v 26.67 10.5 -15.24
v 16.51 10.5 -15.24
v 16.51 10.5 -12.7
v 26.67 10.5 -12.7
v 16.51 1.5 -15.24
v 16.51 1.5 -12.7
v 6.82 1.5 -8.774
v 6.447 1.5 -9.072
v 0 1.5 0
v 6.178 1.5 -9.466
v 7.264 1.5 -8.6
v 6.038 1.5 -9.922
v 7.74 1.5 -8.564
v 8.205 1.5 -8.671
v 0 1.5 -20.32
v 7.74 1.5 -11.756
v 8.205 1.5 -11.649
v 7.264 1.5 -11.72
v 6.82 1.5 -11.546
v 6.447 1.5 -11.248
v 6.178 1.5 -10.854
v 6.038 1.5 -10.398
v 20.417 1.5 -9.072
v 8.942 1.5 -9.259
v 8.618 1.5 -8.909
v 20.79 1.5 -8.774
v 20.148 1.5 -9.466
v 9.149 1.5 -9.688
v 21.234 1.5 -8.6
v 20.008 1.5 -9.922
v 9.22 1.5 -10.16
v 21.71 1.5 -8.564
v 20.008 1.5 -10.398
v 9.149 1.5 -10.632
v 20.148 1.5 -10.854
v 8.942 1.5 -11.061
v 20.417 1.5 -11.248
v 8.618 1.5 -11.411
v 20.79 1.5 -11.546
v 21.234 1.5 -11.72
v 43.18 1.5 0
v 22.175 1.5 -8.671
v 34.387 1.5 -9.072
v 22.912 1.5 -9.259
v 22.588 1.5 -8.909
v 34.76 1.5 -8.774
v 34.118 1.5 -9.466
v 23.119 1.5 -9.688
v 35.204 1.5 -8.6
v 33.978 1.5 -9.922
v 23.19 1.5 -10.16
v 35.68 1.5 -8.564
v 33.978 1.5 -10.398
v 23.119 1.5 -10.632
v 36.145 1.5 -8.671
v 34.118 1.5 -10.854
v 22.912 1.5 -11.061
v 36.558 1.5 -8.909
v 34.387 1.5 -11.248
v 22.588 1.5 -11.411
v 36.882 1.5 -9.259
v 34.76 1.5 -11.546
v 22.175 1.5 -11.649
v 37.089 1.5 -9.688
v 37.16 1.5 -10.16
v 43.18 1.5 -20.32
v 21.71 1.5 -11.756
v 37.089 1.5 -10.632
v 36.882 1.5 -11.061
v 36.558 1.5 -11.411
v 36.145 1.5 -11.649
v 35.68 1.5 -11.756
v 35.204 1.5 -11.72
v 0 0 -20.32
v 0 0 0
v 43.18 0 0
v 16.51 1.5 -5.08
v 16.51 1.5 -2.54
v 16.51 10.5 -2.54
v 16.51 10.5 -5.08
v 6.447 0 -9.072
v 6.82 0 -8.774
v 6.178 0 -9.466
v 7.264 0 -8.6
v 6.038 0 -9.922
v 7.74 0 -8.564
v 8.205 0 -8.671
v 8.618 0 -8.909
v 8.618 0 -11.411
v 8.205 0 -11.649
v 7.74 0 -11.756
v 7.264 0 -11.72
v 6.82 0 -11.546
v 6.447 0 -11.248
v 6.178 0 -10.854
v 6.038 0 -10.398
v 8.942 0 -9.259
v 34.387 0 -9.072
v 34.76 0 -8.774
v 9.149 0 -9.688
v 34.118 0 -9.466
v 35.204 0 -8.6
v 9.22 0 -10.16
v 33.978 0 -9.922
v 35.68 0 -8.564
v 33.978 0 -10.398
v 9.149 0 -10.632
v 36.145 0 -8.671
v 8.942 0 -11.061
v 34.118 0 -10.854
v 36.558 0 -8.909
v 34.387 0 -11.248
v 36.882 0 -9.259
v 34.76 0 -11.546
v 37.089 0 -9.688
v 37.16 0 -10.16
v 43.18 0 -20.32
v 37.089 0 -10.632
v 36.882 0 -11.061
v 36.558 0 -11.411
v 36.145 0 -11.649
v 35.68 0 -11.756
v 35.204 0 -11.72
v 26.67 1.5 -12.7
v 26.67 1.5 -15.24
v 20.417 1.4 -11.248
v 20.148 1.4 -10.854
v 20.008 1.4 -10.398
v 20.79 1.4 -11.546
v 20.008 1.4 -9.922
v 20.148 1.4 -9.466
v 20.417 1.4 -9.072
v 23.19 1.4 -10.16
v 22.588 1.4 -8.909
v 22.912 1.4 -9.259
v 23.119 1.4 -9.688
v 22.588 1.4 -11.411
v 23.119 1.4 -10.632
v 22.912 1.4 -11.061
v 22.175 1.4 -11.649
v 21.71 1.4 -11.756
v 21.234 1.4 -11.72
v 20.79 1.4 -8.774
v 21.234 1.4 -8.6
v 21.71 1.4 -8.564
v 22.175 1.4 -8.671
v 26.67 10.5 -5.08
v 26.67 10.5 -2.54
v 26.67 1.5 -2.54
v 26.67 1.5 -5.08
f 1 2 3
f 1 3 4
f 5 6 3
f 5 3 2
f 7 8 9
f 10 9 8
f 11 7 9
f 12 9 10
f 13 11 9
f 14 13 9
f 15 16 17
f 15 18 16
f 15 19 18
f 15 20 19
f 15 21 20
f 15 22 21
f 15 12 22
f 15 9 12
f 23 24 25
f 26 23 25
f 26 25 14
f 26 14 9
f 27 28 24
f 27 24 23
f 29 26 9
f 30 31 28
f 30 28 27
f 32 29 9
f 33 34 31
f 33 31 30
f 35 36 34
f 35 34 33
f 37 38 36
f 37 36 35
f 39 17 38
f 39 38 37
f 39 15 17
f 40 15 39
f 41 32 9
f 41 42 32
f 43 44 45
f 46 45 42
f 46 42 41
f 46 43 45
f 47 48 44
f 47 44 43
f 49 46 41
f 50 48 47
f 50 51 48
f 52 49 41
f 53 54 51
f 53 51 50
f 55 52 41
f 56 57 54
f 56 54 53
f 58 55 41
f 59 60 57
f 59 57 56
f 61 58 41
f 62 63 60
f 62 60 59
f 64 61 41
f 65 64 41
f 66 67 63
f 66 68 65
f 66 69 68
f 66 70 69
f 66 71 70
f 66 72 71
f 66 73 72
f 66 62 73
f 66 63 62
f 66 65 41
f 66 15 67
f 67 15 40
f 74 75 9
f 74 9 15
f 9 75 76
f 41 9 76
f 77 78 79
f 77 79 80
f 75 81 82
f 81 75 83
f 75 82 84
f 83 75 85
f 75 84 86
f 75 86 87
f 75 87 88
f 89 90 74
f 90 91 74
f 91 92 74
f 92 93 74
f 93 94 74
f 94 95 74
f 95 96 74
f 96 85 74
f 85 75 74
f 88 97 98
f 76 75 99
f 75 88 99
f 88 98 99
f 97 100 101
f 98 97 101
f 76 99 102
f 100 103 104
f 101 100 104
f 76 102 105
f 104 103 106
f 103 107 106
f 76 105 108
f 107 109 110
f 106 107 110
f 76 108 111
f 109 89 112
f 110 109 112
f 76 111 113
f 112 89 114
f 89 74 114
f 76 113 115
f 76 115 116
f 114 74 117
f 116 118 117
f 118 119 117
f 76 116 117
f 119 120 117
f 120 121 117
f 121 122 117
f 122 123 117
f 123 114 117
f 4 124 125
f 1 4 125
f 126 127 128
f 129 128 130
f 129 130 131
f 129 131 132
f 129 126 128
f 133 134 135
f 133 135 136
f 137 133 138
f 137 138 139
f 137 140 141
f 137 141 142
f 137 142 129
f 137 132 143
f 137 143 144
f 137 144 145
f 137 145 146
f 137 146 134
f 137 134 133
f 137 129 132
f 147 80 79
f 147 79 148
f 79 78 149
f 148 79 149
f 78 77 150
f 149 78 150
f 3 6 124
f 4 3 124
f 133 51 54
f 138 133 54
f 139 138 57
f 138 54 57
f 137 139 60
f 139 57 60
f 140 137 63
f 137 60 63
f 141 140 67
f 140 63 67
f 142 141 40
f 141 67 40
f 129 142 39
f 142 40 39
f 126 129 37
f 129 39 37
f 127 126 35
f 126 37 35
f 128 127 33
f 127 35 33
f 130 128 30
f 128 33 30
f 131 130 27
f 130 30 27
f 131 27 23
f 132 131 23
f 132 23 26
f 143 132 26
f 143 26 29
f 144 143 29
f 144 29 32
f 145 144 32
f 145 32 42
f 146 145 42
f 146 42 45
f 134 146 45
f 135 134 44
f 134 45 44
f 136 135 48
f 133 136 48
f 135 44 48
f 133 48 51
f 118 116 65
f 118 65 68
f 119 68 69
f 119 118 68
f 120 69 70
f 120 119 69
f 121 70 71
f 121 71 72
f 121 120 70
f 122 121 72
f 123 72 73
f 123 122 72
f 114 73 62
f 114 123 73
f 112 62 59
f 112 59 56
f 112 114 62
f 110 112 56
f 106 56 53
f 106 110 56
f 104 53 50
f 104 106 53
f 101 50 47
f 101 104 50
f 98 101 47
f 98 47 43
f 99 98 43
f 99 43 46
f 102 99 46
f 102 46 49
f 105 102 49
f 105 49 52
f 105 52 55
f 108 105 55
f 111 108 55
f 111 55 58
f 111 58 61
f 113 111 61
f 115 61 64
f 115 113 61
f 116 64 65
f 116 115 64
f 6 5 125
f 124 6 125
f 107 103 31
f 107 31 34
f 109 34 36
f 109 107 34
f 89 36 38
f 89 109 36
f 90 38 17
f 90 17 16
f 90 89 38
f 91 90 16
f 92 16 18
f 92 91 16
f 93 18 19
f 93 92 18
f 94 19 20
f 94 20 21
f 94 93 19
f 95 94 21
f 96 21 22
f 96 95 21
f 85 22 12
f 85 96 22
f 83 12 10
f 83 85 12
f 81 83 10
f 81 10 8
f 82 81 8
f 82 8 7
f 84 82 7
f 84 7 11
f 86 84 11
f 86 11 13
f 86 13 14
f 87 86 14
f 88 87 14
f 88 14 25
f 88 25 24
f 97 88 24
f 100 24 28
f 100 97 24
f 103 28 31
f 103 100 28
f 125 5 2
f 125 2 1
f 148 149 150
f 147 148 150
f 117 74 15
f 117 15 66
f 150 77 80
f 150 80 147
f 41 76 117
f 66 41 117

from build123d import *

# Parameters (mm, degrees)
SKETCH1_W             = 43.18
SKETCH1_H             = 20.32
SKETCH1_R             = 1.6
BOSS_EXTRUDE1_DEPTH   = 1.5
SKETCH2_W             = 10.16
SKETCH2_H             = 2.54
BOSS_EXTRUDE2_DEPTH   = 9
BOSS_EXTRUDE2_2_DEPTH = 9
SKETCH5_R             = 1.6
CUT_EXTRUDE1_DEPTH    = 0.1


with BuildPart() as part:
    # Sketch1 → Boss-Extrude1 (new body)
    with BuildSketch(Plane(origin=(0, 0, 0), x_dir=(1, 0, 0), z_dir=(0, 1, 0))):
        with Locations((21.59, 10.16)):
            Rectangle(SKETCH1_W, SKETCH1_H)
        with Locations((7.62, 10.16)):
            Circle(SKETCH1_R, mode=Mode.SUBTRACT)
        with Locations((35.56, 10.16)):
            Circle(SKETCH1_R, mode=Mode.SUBTRACT)
    extrude(amount=BOSS_EXTRUDE1_DEPTH)

    # Sketch5 → Cut-Extrude1 (cut)
    with BuildSketch(Plane(origin=(0, 1.5, 0), x_dir=(1, 0, 0), z_dir=(0, 1, 0))):
        with Locations((21.59, 10.16)):
            Circle(SKETCH5_R)
    extrude(amount=-CUT_EXTRUDE1_DEPTH, mode=Mode.SUBTRACT)


with BuildPart() as body_2:
    # Sketch2 → Boss-Extrude2 (new body)
    with BuildSketch(Plane(origin=(0, 1.5, 0), x_dir=(1, 0, 0), z_dir=(0, 1, 0))):
        with Locations((21.59, 3.81)):
            Rectangle(SKETCH2_W, SKETCH2_H)
    extrude(amount=BOSS_EXTRUDE2_DEPTH)


with BuildPart() as body_3:
    # Sketch2 → Boss-Extrude2 2 (new body)
    with BuildSketch(Plane(origin=(0, 1.5, 0), x_dir=(1, 0, 0), z_dir=(0, 1, 0))):
        with Locations((21.59, 13.97)):
            Rectangle(SKETCH2_W, SKETCH2_H)
    extrude(amount=BOSS_EXTRUDE2_2_DEPTH)


solid = Compound([part.part, body_2.part, body_3.part])
